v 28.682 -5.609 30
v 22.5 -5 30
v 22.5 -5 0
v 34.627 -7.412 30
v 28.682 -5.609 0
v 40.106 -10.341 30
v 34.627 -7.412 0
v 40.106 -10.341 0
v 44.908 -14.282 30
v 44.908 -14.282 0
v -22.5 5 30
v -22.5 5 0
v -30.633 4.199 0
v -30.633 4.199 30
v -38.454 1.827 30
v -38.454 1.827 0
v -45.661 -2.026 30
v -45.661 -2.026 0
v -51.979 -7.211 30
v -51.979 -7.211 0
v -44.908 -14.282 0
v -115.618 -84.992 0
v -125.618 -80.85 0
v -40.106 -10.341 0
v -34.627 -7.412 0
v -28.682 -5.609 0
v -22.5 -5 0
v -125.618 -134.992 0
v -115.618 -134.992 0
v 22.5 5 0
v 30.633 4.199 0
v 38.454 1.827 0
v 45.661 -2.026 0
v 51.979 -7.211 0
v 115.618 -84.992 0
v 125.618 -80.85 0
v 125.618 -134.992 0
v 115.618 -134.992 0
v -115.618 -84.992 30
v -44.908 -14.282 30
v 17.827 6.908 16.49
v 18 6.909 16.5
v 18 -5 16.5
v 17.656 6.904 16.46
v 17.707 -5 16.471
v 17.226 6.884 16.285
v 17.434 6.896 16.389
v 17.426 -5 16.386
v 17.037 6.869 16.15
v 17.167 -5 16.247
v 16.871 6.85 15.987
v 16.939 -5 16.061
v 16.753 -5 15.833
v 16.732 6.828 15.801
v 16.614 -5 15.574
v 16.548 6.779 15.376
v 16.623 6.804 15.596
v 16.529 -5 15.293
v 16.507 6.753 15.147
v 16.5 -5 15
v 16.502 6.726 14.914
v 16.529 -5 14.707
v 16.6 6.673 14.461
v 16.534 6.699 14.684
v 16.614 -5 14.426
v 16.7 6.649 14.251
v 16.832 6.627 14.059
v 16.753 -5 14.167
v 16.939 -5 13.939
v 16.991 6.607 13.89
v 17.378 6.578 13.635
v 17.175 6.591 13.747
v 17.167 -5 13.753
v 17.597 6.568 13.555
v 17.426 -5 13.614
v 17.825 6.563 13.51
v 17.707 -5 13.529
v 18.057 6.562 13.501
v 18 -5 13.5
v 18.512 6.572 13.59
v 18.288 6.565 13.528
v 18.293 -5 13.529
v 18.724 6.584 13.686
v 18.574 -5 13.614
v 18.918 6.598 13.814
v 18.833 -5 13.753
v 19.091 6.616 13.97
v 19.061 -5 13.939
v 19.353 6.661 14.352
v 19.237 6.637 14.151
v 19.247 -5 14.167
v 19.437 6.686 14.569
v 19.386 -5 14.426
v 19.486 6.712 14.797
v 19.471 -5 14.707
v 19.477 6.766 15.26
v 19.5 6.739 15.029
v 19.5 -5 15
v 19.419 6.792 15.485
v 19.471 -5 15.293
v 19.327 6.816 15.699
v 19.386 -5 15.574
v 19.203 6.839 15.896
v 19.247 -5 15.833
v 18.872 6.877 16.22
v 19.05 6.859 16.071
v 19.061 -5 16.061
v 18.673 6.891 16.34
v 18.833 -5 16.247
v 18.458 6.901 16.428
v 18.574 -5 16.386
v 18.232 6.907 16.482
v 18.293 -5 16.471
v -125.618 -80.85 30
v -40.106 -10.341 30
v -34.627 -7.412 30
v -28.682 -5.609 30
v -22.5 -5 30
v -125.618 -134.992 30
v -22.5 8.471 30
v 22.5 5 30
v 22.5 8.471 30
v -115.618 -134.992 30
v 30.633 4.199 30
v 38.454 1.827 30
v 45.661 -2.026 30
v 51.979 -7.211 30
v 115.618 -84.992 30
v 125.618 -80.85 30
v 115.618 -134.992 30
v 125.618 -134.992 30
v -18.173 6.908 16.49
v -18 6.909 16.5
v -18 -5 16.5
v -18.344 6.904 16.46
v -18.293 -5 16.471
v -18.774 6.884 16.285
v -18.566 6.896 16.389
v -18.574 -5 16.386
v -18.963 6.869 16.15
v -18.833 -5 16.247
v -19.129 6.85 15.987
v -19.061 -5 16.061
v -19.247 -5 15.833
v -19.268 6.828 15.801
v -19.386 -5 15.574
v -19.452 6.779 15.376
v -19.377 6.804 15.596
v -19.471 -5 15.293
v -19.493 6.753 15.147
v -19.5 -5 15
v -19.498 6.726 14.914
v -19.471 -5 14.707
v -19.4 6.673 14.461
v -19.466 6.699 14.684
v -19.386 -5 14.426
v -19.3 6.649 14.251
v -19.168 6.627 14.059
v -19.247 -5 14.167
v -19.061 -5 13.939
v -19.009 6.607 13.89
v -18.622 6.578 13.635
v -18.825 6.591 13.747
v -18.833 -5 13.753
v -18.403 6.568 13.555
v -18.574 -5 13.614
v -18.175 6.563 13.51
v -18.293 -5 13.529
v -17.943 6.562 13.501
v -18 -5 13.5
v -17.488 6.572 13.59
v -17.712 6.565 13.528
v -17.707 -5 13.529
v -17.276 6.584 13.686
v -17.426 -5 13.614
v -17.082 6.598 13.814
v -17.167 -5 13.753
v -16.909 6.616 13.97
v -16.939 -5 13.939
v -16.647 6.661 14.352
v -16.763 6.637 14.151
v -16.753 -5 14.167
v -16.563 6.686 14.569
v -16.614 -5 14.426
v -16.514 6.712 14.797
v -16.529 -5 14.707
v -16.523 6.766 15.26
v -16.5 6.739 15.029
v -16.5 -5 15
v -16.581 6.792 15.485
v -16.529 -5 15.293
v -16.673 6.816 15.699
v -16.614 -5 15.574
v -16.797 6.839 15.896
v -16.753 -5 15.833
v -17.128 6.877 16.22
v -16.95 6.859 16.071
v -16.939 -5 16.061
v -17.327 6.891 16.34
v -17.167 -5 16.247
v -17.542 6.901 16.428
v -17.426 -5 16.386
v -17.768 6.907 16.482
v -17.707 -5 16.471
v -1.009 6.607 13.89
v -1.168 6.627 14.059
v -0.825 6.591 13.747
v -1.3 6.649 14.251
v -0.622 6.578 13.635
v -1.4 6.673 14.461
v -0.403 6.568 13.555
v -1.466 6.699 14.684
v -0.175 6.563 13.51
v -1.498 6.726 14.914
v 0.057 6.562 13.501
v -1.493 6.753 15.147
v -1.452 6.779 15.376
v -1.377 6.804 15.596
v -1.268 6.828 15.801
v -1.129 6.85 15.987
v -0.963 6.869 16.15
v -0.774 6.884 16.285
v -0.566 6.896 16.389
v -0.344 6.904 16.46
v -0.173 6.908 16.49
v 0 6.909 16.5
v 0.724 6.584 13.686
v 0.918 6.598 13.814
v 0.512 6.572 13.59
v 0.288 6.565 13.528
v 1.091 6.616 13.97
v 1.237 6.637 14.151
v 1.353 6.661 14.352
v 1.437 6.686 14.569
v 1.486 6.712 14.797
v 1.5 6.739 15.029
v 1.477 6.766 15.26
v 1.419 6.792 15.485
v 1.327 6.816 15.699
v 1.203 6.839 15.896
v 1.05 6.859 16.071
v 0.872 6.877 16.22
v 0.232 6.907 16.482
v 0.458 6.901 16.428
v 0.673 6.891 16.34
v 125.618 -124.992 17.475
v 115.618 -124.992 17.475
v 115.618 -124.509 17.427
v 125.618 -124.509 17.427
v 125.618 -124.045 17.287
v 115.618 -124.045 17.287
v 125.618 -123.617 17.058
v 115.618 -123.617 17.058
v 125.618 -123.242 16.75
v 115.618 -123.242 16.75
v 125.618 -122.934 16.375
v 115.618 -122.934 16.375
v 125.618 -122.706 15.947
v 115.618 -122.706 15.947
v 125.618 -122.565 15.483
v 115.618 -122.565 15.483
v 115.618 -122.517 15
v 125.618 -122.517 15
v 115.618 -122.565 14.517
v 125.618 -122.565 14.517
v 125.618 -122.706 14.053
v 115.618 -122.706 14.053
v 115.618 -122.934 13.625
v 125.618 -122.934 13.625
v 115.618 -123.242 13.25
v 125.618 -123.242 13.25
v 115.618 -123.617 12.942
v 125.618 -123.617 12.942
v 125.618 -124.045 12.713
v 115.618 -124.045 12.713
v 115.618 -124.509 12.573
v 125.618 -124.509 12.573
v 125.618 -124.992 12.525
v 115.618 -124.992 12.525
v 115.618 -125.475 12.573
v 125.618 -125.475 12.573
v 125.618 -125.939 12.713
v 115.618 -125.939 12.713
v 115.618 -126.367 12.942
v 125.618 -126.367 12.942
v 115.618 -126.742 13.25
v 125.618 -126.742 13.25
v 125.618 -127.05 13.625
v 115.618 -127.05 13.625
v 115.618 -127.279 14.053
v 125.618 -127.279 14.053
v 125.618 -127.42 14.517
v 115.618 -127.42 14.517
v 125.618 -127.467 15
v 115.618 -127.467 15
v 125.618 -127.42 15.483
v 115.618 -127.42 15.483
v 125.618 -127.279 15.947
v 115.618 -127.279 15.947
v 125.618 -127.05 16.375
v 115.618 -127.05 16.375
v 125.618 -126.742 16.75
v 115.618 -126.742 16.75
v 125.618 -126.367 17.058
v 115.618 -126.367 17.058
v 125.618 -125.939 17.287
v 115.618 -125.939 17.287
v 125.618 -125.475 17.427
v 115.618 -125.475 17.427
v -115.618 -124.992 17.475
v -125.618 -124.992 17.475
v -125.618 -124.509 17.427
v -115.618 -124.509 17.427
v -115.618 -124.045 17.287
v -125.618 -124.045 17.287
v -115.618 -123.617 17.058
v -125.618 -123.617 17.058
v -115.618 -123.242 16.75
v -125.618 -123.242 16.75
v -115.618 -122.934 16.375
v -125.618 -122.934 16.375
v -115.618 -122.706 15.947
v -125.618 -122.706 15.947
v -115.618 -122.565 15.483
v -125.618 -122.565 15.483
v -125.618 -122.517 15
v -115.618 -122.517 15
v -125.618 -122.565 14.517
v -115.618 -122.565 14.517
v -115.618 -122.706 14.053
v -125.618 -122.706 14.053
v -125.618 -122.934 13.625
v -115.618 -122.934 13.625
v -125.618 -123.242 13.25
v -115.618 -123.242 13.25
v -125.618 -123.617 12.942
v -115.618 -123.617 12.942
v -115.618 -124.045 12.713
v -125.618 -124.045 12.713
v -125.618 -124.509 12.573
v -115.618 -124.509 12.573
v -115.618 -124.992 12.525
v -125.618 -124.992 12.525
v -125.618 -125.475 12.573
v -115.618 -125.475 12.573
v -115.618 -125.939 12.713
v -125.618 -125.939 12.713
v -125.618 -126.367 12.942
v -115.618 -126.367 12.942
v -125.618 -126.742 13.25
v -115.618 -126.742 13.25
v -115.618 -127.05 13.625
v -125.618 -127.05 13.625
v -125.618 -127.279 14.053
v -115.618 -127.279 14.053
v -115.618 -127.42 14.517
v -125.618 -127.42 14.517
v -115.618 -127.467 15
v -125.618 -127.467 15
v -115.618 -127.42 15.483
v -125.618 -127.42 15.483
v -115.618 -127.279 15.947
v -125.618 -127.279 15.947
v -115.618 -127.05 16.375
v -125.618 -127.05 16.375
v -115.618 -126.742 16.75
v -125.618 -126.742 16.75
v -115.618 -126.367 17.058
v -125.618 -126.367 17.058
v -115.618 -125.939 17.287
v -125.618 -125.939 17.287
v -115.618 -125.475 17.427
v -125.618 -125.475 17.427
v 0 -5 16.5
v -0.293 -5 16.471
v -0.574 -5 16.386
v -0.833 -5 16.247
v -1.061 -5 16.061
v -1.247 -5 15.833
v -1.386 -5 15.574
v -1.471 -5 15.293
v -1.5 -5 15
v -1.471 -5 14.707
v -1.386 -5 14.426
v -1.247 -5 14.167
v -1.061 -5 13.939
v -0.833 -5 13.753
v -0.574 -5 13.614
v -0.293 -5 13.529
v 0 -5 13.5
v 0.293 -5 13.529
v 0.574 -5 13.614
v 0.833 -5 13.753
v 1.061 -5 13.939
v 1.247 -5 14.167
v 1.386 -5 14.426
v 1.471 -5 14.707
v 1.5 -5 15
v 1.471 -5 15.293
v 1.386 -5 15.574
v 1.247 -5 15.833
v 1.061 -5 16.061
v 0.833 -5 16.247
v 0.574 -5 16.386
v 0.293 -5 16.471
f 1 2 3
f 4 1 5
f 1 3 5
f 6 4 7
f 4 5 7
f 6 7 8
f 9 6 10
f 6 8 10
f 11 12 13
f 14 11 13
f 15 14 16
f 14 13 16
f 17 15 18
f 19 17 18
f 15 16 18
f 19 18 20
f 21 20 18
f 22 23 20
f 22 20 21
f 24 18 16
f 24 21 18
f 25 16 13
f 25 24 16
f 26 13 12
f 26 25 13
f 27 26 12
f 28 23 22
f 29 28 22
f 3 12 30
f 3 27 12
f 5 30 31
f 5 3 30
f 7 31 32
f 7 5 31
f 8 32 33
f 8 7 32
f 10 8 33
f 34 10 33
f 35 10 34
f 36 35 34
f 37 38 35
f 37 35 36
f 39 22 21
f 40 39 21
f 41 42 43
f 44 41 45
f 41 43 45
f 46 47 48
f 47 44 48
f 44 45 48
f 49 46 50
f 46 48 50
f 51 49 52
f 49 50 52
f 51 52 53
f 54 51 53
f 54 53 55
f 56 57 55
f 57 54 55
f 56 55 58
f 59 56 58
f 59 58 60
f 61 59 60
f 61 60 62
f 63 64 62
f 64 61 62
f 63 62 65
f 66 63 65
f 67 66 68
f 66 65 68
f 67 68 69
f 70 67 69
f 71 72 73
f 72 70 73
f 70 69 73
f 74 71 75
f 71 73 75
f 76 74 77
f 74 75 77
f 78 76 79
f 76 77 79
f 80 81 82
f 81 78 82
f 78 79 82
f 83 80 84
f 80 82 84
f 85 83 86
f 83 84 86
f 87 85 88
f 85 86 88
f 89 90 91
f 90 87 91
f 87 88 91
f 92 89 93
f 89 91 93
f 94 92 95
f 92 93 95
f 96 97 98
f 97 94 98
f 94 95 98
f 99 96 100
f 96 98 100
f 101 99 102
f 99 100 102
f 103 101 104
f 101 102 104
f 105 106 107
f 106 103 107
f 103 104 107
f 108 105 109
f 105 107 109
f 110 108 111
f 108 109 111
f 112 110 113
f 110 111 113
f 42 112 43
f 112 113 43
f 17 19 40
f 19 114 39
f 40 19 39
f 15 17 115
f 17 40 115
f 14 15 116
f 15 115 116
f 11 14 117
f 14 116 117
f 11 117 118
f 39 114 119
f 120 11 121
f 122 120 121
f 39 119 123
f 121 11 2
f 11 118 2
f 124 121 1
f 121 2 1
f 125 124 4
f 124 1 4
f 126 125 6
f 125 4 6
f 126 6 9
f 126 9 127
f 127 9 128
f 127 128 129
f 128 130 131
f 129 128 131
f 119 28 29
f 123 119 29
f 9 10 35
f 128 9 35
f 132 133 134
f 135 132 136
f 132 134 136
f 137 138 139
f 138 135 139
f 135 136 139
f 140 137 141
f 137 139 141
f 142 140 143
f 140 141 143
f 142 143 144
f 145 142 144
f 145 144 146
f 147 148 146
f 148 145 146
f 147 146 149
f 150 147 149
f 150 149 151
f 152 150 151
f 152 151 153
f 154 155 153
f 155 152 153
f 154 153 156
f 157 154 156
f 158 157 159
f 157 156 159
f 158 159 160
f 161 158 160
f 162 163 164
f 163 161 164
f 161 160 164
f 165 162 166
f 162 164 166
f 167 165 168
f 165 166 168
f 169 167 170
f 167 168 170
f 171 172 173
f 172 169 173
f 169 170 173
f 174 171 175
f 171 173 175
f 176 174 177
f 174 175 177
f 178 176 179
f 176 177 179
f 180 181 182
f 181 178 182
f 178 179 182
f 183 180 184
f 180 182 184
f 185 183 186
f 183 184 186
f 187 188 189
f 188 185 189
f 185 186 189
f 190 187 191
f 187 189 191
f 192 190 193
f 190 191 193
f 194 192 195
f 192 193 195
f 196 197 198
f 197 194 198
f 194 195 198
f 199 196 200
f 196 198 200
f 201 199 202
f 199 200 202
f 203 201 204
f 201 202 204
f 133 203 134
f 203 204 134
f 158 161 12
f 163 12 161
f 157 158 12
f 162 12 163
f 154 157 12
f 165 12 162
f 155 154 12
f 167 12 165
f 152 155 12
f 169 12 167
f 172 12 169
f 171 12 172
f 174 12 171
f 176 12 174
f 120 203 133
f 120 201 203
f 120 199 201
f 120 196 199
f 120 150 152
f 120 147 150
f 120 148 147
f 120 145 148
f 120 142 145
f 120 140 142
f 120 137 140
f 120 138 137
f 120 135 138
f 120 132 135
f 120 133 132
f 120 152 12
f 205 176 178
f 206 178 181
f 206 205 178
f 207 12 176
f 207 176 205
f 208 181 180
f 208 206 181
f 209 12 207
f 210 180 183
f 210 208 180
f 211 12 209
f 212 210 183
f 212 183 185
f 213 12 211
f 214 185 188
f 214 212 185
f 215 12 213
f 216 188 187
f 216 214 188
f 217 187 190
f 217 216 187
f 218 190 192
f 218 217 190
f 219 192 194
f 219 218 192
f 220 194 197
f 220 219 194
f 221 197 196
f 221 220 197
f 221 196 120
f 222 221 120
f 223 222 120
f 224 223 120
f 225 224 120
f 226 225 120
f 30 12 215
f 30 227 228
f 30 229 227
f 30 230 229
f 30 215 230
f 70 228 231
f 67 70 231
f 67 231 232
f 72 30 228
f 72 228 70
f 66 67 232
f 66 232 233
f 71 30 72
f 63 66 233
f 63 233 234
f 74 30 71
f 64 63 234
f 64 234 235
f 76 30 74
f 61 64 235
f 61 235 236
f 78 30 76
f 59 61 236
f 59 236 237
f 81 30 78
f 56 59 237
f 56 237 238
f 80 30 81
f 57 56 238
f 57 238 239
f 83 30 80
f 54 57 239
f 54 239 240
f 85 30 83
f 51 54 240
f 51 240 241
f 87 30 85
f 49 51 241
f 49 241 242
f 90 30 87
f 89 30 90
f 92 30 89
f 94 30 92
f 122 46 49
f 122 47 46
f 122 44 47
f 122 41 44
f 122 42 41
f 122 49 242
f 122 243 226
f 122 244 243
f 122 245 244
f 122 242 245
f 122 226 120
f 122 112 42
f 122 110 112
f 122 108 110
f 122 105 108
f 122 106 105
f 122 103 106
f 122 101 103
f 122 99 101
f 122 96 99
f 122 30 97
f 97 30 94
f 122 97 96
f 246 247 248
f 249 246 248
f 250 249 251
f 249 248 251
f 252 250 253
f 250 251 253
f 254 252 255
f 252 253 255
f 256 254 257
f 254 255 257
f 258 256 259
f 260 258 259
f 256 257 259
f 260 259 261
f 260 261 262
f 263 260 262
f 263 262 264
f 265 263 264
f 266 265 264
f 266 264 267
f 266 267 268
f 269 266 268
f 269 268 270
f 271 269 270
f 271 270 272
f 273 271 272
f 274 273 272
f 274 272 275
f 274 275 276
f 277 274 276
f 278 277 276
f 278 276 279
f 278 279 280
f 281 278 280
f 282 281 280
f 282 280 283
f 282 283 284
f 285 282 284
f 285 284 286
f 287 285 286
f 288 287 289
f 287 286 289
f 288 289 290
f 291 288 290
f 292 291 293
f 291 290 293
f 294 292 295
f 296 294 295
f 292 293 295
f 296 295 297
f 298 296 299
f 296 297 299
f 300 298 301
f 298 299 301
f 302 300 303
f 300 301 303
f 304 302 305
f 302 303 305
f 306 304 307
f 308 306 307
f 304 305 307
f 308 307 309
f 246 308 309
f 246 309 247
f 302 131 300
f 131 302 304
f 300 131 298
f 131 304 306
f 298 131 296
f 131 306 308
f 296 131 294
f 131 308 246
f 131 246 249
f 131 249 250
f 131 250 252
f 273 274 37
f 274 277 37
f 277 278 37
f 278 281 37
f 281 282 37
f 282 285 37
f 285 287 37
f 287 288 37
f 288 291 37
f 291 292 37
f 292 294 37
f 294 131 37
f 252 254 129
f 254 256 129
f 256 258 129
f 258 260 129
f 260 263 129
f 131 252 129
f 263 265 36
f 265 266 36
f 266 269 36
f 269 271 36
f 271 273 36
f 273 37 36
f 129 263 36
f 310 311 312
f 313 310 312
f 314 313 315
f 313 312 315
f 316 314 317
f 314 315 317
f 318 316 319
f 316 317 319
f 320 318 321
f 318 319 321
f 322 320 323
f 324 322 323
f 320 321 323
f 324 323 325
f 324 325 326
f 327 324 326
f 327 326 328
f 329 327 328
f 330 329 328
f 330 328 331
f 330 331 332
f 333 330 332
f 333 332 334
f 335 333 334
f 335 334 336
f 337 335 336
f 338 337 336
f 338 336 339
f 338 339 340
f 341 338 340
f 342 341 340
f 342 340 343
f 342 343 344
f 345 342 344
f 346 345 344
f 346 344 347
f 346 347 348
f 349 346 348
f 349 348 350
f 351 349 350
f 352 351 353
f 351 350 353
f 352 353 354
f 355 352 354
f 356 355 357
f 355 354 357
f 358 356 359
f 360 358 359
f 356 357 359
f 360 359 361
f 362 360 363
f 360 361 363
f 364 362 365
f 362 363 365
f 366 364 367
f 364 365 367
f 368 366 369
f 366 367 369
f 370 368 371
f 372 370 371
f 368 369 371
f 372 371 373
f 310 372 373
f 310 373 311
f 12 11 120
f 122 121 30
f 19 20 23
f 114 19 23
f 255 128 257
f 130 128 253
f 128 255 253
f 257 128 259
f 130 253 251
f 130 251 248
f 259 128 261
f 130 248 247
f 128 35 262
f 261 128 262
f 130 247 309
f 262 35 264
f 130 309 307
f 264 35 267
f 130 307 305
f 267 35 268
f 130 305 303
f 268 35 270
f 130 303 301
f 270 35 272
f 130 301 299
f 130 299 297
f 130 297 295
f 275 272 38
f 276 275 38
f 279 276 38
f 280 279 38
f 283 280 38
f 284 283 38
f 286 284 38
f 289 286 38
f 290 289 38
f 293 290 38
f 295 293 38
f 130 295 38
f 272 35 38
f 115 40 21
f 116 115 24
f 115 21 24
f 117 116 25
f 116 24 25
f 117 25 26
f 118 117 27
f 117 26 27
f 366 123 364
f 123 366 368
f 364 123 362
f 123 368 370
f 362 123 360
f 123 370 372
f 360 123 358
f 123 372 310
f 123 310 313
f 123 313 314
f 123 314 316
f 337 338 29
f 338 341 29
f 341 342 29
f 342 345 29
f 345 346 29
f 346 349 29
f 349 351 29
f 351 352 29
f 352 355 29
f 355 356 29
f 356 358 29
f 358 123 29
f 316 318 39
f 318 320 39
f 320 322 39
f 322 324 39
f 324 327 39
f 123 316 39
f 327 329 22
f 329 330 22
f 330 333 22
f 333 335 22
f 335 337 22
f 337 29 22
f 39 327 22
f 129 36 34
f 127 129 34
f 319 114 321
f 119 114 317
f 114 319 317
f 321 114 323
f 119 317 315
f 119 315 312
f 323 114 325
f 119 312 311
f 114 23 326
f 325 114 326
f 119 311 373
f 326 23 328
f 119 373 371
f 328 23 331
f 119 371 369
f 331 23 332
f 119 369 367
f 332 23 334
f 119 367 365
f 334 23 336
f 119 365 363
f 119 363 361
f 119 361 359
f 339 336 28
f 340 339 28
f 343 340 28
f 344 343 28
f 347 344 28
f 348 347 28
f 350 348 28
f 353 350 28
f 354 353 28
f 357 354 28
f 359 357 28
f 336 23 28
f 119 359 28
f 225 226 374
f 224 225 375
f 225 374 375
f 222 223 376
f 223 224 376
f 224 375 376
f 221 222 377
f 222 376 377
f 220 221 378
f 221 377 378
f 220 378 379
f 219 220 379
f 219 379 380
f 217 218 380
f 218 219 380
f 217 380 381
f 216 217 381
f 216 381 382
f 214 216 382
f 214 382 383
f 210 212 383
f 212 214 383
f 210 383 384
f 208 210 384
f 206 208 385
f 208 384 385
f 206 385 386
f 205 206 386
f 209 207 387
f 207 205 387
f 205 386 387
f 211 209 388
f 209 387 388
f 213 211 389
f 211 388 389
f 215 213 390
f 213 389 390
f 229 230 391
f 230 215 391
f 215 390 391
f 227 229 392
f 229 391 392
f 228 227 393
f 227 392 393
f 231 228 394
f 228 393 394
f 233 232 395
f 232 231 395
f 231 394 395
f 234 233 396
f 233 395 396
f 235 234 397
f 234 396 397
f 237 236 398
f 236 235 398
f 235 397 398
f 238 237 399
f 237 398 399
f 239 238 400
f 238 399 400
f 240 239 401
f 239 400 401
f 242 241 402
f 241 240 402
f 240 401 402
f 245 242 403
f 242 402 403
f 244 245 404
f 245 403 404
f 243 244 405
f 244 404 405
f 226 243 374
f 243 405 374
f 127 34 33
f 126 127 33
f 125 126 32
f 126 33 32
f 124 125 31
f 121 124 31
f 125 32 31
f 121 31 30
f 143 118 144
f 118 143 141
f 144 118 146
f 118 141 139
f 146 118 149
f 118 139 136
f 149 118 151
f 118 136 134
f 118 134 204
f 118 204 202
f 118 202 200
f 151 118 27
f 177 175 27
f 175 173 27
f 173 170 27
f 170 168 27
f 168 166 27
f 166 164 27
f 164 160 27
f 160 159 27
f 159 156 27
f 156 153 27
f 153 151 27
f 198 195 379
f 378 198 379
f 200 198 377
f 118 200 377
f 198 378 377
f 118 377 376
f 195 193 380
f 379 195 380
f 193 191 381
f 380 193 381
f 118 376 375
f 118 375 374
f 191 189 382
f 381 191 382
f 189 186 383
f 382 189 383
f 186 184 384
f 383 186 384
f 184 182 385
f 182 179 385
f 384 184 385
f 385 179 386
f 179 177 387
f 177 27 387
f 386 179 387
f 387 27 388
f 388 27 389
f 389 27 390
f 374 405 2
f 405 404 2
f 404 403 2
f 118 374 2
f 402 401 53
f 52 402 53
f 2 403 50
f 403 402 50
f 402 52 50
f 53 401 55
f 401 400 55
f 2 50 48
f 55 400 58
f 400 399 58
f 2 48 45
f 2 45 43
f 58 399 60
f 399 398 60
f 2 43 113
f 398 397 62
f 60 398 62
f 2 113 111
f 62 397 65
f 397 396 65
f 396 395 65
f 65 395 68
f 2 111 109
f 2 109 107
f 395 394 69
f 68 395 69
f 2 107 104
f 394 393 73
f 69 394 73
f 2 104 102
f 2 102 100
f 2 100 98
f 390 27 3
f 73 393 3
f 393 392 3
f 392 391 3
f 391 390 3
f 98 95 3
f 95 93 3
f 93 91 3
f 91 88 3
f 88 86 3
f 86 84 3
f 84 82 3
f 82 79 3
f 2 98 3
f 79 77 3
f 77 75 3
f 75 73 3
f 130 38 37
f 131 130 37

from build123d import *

# Parameters (mm, degrees)
SALIENTE_EXTRUIR1_DEPTH = 30
CROQUIS3_R              = 2.475
CORTAR_EXTRUIR1_DEPTH   = 287.780312831
CROQUIS4_R              = 1.5
CORTAR_EXTRUIR2_DEPTH   = 191.467453482
CROQUIS5_W              = 45
CROQUIS5_H              = 30
SALIENTE_EXTRUIR2_DEPTH = 12
CORTAR_EXTRUIR3_DEPTH   = 203.637632672
CROQUIS7_R              = 1.5
CORTAR_EXTRUIR4_DEPTH   = 184.243021226


with BuildPart() as part:
    # Croquis1 → Saliente-Extruir1 (new body)
    with BuildSketch(Plane.XY):
        with BuildLine():
            Line((-22.5, -5), (22.5, -5))
            ThreePointArc((22.5, -5), (34.627023925, -7.412215038), (44.90781839, -14.28162228))
            Line((44.90781839, -14.28162228), (115.618496509, -84.992300399))
            Line((115.618496509, -84.992300399), (115.618496509, -134.992300399))
            Line((115.618496509, -134.992300399), (125.618496509, -134.992300399))
            Line((125.618496509, -134.992300399), (125.618496509, -80.850164775))
            Line((125.618496509, -80.850164775), (122.689564321, -77.921232587))
            Line((122.689564321, -77.921232587), (51.978886202, -7.210554468))
            ThreePointArc((51.978886202, -7.210554468), (38.453858249, 1.826580287), (22.5, 5))
            Line((22.5, 5), (-22.5, 5))
            ThreePointArc((-22.5, 5), (-38.453858249, 1.826580287), (-51.978886202, -7.210554468))
            Line((-51.978886202, -7.210554468), (-122.689564321, -77.921232587))
            Line((-122.689564321, -77.921232587), (-125.618496509, -80.850164775))
            Line((-125.618496509, -80.850164775), (-125.618496509, -134.992300399))
            Line((-125.618496509, -134.992300399), (-115.618496509, -134.992300399))
            Line((-115.618496509, -134.992300399), (-115.618496509, -84.992300399))
            Line((-115.618496509, -84.992300399), (-44.90781839, -14.28162228))
            ThreePointArc((-44.90781839, -14.28162228), (-34.627023925, -7.412215038), (-22.5, -5))
        make_face()
    extrude(amount=SALIENTE_EXTRUIR1_DEPTH)

    # Croquis3 → Cortar-Extruir1 (cut, through all)
    with BuildSketch(Plane.ZY.offset(125.618496509)):
        with Locations((15, -124.992300399)):
            Circle(CROQUIS3_R)
    extrude(amount=-CORTAR_EXTRUIR1_DEPTH, mode=Mode.SUBTRACT)

    # Croquis4 → Cortar-Extruir2 (cut, through all)
    with BuildSketch(Plane(origin=(0, 5, 0), x_dir=(1, 0, 0), z_dir=(0, 1, 0))):
        with Locations(Location((0, -15, 0), (0, 0, 270))):
            Circle(CROQUIS4_R)
        with Locations(Location((18, -15, 0), (0, 0, 270))):
            Circle(CROQUIS4_R)
        with Locations(Location((-18, -15, 0), (0, 0, 270))):
            Circle(CROQUIS4_R)
    extrude(amount=-CORTAR_EXTRUIR2_DEPTH, mode=Mode.SUBTRACT)

    # Croquis5 → Saliente-Extruir2 (add)
    with BuildSketch(Plane(origin=(0, 5, 0), x_dir=(1, 0, 0), z_dir=(0, 1, 0))):
        with Locations((0, -15)):
            Rectangle(CROQUIS5_W, CROQUIS5_H)
    extrude(amount=SALIENTE_EXTRUIR2_DEPTH)

    # Croquis6 → Cortar-Extruir3 (cut, through all)
    with BuildSketch(Plane(origin=(22.5, 0, 0), x_dir=(0, 0, -1), z_dir=(1, 0, 0))):
        Polygon((0, 5), (-30, 8.47111843), (-30, 19.923097654), (0, 19.923097654), align=None)
    extrude(amount=-CORTAR_EXTRUIR3_DEPTH, mode=Mode.SUBTRACT)

    # Croquis7 → Cortar-Extruir4 (cut, through all)
    with BuildSketch(Plane.XZ.offset(5)):
        with Locations(Location((0, 15, 0), (0, 0, 90))):
            Circle(CROQUIS7_R)
        with Locations(Location((-18, 15, 0), (0, 0, 90))):
            Circle(CROQUIS7_R)
        with Locations(Location((18, 15, 0), (0, 0, 90))):
            Circle(CROQUIS7_R)
    extrude(amount=-CORTAR_EXTRUIR4_DEPTH, mode=Mode.SUBTRACT)


solid = part.part
